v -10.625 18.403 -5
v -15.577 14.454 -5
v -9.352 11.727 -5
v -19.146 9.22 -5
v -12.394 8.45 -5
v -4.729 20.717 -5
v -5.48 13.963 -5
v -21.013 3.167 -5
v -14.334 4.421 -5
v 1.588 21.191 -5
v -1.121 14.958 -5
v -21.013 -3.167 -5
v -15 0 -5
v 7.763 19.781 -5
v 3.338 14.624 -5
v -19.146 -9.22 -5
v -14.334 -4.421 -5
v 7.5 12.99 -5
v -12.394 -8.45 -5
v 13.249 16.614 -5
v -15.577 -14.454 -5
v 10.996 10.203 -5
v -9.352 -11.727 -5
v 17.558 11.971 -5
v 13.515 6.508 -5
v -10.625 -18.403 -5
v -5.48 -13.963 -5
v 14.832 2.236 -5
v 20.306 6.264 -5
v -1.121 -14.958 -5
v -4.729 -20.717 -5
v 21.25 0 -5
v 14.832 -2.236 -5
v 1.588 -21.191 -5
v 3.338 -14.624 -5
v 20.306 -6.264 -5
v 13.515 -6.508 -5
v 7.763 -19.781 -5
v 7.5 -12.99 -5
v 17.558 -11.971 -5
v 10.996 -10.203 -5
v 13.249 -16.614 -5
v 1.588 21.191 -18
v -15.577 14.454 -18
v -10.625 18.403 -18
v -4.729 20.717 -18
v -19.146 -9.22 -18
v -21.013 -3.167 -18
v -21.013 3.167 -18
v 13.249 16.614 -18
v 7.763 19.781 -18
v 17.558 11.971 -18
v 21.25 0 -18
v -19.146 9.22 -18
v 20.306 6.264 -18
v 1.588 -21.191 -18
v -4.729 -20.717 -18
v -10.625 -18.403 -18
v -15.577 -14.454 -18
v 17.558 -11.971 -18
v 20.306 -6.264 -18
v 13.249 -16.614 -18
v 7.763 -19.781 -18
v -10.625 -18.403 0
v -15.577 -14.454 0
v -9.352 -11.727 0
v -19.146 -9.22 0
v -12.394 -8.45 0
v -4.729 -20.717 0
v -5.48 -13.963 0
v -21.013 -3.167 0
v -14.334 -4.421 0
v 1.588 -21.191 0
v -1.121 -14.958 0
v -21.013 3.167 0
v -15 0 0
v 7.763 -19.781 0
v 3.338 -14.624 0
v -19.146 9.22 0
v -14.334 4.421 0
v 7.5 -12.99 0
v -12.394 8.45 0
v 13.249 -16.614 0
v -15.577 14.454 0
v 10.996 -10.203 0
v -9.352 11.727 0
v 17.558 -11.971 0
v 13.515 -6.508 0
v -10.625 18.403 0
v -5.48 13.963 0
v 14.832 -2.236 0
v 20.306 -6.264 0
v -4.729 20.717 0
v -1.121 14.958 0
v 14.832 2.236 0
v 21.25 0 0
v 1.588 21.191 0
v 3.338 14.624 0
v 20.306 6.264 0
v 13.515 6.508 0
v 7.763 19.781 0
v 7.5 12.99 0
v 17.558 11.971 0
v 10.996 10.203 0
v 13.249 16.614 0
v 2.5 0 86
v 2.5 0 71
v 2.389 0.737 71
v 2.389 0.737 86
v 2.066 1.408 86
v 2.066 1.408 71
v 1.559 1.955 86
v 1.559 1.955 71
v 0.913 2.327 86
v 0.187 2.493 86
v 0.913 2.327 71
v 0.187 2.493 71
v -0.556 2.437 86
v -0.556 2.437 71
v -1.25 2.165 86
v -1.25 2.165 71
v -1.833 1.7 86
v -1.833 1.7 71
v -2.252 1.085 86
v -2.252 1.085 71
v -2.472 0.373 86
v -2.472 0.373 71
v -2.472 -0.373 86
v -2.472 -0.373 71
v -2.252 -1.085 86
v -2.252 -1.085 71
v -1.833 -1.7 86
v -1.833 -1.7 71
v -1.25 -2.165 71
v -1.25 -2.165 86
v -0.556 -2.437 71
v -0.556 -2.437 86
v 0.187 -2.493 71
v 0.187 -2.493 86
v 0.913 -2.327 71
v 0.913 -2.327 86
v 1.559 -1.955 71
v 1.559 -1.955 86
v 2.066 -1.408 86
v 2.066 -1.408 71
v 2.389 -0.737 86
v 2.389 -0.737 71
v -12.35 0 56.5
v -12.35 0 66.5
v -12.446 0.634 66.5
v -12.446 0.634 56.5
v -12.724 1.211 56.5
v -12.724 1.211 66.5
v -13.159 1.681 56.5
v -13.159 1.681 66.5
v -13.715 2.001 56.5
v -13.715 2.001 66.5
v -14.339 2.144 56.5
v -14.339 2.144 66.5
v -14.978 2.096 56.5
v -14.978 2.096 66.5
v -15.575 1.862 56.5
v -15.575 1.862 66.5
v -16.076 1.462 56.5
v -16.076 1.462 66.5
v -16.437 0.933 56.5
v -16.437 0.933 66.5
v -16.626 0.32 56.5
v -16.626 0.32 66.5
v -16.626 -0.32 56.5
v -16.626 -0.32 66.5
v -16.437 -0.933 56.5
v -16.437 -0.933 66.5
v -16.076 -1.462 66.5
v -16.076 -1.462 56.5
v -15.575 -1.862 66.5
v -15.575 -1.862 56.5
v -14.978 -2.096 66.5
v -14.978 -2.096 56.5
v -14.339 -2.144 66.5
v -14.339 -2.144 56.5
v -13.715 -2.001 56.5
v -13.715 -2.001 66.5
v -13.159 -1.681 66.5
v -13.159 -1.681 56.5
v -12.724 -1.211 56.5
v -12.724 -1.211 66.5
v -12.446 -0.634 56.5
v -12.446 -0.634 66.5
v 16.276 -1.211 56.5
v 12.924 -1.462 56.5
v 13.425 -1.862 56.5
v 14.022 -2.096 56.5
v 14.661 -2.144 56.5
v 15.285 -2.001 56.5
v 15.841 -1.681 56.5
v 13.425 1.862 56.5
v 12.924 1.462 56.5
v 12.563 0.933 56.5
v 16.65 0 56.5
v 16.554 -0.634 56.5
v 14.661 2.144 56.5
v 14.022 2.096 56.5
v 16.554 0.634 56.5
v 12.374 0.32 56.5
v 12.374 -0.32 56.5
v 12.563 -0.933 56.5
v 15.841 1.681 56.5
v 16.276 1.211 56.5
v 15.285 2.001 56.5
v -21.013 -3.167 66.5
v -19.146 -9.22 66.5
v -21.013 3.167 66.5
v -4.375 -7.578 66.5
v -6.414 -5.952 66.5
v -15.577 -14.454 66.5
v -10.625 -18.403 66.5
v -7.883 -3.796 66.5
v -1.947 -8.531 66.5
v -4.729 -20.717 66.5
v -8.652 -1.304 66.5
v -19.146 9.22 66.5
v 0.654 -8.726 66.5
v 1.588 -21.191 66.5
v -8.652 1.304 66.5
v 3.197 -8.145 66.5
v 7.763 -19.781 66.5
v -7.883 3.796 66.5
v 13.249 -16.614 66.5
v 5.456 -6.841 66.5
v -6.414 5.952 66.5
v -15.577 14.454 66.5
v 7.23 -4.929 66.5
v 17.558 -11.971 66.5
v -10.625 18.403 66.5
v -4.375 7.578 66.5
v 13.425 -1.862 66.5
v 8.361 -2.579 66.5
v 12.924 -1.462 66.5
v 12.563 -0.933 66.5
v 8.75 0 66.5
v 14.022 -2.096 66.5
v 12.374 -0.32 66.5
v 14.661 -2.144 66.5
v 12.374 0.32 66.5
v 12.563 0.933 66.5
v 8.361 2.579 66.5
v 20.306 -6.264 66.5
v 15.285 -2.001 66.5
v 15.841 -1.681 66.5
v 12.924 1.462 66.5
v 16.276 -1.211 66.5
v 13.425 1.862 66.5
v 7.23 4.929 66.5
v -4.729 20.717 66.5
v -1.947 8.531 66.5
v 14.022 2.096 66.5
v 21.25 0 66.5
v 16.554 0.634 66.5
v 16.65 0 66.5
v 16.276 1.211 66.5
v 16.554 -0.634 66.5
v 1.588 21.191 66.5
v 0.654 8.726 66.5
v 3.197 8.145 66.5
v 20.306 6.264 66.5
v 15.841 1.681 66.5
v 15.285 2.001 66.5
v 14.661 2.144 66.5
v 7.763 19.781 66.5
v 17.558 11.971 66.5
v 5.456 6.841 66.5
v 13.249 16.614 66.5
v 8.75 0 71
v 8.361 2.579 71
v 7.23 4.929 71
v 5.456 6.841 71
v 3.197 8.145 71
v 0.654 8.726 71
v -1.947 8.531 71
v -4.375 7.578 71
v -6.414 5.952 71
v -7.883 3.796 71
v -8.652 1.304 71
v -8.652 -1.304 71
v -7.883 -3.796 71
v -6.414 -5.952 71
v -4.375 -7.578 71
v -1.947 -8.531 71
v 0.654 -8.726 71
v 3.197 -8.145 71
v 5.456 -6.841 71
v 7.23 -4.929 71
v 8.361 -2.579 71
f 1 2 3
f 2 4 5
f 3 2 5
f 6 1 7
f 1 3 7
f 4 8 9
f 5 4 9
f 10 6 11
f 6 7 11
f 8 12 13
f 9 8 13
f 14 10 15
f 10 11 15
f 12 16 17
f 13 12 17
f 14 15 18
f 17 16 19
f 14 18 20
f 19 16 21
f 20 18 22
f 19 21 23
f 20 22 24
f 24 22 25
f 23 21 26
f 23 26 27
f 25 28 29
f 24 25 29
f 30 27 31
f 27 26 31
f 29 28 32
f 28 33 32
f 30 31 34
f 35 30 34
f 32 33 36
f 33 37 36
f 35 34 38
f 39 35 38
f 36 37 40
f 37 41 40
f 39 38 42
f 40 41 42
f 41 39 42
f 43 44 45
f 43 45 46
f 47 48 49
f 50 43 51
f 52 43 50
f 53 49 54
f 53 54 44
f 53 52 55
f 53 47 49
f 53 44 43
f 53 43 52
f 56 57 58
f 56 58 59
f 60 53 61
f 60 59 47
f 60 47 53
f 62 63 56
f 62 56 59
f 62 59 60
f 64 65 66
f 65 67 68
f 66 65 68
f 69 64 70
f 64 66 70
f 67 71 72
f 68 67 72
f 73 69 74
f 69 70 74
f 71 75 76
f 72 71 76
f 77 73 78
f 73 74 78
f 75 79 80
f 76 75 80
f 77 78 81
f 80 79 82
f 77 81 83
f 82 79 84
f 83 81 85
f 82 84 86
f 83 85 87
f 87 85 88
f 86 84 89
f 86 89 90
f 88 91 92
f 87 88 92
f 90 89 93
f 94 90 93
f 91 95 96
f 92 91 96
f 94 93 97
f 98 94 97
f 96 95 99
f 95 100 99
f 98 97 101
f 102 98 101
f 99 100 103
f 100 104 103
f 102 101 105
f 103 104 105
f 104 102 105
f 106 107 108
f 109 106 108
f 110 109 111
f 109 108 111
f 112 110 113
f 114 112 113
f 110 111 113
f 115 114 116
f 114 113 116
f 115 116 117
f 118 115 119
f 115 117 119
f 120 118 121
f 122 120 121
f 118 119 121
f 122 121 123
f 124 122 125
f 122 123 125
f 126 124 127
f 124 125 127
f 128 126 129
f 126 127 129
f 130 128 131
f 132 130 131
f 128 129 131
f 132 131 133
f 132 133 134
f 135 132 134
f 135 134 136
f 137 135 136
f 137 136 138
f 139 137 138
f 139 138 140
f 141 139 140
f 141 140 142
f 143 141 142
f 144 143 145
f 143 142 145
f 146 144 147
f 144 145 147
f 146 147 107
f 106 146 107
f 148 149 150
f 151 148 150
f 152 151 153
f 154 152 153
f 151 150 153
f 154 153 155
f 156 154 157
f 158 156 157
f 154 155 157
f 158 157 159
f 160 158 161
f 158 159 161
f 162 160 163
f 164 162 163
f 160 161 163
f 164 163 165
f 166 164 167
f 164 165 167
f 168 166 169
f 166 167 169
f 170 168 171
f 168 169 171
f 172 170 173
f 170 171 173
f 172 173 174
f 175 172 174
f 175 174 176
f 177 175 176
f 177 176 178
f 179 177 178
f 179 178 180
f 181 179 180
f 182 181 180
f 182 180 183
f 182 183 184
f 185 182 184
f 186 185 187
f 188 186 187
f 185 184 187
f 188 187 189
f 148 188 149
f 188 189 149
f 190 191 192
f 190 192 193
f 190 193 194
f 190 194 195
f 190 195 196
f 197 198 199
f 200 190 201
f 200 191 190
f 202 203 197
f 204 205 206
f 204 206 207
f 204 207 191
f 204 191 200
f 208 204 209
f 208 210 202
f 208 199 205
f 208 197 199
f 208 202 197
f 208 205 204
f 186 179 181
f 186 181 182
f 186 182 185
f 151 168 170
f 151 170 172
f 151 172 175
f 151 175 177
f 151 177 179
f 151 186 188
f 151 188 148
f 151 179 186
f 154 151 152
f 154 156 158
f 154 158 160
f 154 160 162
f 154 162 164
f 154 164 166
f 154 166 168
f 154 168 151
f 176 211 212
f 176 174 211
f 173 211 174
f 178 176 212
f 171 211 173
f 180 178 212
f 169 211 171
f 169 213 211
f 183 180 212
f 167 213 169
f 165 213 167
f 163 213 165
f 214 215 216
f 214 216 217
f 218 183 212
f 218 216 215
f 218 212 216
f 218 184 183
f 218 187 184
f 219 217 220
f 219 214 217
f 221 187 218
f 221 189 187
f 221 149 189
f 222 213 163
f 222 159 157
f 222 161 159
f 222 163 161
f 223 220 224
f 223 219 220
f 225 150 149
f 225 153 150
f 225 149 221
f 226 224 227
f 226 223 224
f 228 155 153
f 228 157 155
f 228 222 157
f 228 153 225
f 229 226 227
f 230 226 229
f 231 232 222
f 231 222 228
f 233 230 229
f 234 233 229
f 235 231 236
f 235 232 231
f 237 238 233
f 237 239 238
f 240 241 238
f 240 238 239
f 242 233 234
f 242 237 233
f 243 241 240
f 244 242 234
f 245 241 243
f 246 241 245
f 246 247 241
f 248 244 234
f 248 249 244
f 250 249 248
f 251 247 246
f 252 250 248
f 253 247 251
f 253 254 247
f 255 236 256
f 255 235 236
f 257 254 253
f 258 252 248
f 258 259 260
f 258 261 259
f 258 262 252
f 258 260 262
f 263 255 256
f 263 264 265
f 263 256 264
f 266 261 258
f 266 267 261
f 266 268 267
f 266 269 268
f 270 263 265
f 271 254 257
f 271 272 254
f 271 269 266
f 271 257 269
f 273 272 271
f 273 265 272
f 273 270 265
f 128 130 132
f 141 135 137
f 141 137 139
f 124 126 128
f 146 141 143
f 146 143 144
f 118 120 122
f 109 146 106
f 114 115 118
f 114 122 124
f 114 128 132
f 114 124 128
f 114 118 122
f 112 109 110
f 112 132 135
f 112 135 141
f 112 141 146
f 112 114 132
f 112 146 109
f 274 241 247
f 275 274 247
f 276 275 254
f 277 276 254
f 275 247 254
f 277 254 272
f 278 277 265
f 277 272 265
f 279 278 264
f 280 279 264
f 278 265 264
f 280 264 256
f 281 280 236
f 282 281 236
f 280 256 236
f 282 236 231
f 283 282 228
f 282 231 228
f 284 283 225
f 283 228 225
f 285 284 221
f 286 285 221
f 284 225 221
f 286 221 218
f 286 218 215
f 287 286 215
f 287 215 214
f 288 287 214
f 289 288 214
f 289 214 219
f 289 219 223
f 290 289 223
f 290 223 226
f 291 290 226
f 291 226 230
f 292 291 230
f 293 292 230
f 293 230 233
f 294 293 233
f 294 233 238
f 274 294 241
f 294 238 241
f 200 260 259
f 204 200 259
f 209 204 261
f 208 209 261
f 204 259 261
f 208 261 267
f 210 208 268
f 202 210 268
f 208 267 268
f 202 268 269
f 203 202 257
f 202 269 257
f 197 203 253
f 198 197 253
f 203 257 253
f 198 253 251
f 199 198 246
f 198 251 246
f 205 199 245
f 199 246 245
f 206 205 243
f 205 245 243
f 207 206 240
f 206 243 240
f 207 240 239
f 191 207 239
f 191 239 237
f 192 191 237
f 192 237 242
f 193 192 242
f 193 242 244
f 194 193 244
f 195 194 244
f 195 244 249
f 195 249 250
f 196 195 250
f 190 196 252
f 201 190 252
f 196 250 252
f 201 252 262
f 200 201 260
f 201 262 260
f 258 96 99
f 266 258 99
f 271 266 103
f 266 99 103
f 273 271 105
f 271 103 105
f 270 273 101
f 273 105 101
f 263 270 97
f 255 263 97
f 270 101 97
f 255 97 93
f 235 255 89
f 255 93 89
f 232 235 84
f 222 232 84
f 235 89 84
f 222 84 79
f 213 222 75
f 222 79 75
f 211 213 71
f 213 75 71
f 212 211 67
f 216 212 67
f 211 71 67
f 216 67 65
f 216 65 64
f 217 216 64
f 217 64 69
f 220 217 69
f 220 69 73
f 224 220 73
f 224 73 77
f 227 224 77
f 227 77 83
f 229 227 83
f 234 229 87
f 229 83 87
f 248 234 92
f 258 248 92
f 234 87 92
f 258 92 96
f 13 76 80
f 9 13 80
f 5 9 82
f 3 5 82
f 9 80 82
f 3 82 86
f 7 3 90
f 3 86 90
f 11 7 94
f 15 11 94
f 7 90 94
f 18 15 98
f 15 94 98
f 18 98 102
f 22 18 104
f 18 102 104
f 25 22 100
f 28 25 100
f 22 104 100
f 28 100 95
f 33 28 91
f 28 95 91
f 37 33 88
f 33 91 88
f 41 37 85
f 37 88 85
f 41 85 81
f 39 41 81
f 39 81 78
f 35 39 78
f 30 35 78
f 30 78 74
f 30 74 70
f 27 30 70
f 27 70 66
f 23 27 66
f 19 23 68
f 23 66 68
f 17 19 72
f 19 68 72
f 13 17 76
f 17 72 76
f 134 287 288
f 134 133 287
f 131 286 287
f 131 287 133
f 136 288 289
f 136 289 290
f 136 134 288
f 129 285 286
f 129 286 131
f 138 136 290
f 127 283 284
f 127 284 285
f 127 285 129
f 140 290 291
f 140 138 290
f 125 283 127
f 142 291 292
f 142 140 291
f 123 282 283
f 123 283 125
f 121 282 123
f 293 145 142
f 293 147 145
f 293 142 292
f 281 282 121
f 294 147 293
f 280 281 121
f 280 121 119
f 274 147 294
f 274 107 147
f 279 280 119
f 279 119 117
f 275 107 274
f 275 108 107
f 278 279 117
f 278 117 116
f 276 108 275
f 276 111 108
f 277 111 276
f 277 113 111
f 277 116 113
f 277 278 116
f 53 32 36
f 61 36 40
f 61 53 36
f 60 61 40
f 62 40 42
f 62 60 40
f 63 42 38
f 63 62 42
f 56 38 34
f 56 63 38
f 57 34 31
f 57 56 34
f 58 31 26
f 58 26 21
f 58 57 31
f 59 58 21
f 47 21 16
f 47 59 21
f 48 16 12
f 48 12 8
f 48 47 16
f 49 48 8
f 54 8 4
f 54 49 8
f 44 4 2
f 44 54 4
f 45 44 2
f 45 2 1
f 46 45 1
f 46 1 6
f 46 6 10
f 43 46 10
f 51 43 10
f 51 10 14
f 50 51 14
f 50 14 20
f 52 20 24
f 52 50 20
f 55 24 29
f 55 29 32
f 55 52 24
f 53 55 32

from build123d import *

# Parameters (mm, degrees)
SKIZZE1_R                       = 21.25
AUFSATZ_LINEAR_AUSTRAGEN1_DEPTH = 66.5
SKIZZE2_R                       = 8.75
AUFSATZ_LINEAR_AUSTRAGEN2_DEPTH = 4.5
SKIZZE3_R                       = 2.5
AUFSATZ_LINEAR_AUSTRAGEN3_DEPTH = 15
SKIZZE4_R                       = 2.15
SCHNITT_LINEAR_AUSTRAGEN1_DEPTH = 10
SKIZZE5_R                       = 15
AUFSATZ_LINEAR_AUSTRAGEN4_DEPTH = 5
AUFSATZ_LINEAR_START            = 13
SKIZZE6_R                       = 21.25
AUFSATZ_LINEAR_AUSTRAGEN5_DEPTH = 13


with BuildPart() as part:
    # Skizze1 → Aufsatz-Linear austragen1 (new body)
    with BuildSketch(Plane.XY):
        Circle(SKIZZE1_R)
    extrude(amount=AUFSATZ_LINEAR_AUSTRAGEN1_DEPTH)

    # Skizze2 → Aufsatz-Linear austragen2 (add)
    with BuildSketch(Plane.XY.offset(66.5)):
        Circle(SKIZZE2_R)
    extrude(amount=AUFSATZ_LINEAR_AUSTRAGEN2_DEPTH)

    # Skizze3 → Aufsatz-Linear austragen3 (add)
    with BuildSketch(Plane.XY.offset(71)):
        Circle(SKIZZE3_R)
    extrude(amount=AUFSATZ_LINEAR_AUSTRAGEN3_DEPTH)

    # Skizze4 → Schnitt-Linear austragen1 (cut)
    with BuildSketch(Plane.XY.offset(66.5)):
        with Locations((-14.5, 0)):
            Circle(SKIZZE4_R)
        with Locations((14.5, 0)):
            Circle(SKIZZE4_R)
    extrude(amount=-SCHNITT_LINEAR_AUSTRAGEN1_DEPTH, mode=Mode.SUBTRACT)

    # Skizze5 → Aufsatz-Linear austragen4 (add)
    with BuildSketch(Plane(origin=(0, 0, 0), x_dir=(-1, 0, 0), z_dir=(0, 0, -1))):
        Circle(SKIZZE5_R)
    extrude(amount=AUFSATZ_LINEAR_AUSTRAGEN4_DEPTH)

    # Skizze6 → Aufsatz-Linear austragen5 (add)
    with BuildSketch(Plane(origin=(0, 0, -5), x_dir=(-1, 0, 0), z_dir=(0, 0, -1)).offset(AUFSATZ_LINEAR_START)):
        with Locations(Location((0, 0, 0), (0, 0, 180))):
            Circle(SKIZZE6_R)
    extrude(amount=-AUFSATZ_LINEAR_AUSTRAGEN5_DEPTH)


solid = part.part
